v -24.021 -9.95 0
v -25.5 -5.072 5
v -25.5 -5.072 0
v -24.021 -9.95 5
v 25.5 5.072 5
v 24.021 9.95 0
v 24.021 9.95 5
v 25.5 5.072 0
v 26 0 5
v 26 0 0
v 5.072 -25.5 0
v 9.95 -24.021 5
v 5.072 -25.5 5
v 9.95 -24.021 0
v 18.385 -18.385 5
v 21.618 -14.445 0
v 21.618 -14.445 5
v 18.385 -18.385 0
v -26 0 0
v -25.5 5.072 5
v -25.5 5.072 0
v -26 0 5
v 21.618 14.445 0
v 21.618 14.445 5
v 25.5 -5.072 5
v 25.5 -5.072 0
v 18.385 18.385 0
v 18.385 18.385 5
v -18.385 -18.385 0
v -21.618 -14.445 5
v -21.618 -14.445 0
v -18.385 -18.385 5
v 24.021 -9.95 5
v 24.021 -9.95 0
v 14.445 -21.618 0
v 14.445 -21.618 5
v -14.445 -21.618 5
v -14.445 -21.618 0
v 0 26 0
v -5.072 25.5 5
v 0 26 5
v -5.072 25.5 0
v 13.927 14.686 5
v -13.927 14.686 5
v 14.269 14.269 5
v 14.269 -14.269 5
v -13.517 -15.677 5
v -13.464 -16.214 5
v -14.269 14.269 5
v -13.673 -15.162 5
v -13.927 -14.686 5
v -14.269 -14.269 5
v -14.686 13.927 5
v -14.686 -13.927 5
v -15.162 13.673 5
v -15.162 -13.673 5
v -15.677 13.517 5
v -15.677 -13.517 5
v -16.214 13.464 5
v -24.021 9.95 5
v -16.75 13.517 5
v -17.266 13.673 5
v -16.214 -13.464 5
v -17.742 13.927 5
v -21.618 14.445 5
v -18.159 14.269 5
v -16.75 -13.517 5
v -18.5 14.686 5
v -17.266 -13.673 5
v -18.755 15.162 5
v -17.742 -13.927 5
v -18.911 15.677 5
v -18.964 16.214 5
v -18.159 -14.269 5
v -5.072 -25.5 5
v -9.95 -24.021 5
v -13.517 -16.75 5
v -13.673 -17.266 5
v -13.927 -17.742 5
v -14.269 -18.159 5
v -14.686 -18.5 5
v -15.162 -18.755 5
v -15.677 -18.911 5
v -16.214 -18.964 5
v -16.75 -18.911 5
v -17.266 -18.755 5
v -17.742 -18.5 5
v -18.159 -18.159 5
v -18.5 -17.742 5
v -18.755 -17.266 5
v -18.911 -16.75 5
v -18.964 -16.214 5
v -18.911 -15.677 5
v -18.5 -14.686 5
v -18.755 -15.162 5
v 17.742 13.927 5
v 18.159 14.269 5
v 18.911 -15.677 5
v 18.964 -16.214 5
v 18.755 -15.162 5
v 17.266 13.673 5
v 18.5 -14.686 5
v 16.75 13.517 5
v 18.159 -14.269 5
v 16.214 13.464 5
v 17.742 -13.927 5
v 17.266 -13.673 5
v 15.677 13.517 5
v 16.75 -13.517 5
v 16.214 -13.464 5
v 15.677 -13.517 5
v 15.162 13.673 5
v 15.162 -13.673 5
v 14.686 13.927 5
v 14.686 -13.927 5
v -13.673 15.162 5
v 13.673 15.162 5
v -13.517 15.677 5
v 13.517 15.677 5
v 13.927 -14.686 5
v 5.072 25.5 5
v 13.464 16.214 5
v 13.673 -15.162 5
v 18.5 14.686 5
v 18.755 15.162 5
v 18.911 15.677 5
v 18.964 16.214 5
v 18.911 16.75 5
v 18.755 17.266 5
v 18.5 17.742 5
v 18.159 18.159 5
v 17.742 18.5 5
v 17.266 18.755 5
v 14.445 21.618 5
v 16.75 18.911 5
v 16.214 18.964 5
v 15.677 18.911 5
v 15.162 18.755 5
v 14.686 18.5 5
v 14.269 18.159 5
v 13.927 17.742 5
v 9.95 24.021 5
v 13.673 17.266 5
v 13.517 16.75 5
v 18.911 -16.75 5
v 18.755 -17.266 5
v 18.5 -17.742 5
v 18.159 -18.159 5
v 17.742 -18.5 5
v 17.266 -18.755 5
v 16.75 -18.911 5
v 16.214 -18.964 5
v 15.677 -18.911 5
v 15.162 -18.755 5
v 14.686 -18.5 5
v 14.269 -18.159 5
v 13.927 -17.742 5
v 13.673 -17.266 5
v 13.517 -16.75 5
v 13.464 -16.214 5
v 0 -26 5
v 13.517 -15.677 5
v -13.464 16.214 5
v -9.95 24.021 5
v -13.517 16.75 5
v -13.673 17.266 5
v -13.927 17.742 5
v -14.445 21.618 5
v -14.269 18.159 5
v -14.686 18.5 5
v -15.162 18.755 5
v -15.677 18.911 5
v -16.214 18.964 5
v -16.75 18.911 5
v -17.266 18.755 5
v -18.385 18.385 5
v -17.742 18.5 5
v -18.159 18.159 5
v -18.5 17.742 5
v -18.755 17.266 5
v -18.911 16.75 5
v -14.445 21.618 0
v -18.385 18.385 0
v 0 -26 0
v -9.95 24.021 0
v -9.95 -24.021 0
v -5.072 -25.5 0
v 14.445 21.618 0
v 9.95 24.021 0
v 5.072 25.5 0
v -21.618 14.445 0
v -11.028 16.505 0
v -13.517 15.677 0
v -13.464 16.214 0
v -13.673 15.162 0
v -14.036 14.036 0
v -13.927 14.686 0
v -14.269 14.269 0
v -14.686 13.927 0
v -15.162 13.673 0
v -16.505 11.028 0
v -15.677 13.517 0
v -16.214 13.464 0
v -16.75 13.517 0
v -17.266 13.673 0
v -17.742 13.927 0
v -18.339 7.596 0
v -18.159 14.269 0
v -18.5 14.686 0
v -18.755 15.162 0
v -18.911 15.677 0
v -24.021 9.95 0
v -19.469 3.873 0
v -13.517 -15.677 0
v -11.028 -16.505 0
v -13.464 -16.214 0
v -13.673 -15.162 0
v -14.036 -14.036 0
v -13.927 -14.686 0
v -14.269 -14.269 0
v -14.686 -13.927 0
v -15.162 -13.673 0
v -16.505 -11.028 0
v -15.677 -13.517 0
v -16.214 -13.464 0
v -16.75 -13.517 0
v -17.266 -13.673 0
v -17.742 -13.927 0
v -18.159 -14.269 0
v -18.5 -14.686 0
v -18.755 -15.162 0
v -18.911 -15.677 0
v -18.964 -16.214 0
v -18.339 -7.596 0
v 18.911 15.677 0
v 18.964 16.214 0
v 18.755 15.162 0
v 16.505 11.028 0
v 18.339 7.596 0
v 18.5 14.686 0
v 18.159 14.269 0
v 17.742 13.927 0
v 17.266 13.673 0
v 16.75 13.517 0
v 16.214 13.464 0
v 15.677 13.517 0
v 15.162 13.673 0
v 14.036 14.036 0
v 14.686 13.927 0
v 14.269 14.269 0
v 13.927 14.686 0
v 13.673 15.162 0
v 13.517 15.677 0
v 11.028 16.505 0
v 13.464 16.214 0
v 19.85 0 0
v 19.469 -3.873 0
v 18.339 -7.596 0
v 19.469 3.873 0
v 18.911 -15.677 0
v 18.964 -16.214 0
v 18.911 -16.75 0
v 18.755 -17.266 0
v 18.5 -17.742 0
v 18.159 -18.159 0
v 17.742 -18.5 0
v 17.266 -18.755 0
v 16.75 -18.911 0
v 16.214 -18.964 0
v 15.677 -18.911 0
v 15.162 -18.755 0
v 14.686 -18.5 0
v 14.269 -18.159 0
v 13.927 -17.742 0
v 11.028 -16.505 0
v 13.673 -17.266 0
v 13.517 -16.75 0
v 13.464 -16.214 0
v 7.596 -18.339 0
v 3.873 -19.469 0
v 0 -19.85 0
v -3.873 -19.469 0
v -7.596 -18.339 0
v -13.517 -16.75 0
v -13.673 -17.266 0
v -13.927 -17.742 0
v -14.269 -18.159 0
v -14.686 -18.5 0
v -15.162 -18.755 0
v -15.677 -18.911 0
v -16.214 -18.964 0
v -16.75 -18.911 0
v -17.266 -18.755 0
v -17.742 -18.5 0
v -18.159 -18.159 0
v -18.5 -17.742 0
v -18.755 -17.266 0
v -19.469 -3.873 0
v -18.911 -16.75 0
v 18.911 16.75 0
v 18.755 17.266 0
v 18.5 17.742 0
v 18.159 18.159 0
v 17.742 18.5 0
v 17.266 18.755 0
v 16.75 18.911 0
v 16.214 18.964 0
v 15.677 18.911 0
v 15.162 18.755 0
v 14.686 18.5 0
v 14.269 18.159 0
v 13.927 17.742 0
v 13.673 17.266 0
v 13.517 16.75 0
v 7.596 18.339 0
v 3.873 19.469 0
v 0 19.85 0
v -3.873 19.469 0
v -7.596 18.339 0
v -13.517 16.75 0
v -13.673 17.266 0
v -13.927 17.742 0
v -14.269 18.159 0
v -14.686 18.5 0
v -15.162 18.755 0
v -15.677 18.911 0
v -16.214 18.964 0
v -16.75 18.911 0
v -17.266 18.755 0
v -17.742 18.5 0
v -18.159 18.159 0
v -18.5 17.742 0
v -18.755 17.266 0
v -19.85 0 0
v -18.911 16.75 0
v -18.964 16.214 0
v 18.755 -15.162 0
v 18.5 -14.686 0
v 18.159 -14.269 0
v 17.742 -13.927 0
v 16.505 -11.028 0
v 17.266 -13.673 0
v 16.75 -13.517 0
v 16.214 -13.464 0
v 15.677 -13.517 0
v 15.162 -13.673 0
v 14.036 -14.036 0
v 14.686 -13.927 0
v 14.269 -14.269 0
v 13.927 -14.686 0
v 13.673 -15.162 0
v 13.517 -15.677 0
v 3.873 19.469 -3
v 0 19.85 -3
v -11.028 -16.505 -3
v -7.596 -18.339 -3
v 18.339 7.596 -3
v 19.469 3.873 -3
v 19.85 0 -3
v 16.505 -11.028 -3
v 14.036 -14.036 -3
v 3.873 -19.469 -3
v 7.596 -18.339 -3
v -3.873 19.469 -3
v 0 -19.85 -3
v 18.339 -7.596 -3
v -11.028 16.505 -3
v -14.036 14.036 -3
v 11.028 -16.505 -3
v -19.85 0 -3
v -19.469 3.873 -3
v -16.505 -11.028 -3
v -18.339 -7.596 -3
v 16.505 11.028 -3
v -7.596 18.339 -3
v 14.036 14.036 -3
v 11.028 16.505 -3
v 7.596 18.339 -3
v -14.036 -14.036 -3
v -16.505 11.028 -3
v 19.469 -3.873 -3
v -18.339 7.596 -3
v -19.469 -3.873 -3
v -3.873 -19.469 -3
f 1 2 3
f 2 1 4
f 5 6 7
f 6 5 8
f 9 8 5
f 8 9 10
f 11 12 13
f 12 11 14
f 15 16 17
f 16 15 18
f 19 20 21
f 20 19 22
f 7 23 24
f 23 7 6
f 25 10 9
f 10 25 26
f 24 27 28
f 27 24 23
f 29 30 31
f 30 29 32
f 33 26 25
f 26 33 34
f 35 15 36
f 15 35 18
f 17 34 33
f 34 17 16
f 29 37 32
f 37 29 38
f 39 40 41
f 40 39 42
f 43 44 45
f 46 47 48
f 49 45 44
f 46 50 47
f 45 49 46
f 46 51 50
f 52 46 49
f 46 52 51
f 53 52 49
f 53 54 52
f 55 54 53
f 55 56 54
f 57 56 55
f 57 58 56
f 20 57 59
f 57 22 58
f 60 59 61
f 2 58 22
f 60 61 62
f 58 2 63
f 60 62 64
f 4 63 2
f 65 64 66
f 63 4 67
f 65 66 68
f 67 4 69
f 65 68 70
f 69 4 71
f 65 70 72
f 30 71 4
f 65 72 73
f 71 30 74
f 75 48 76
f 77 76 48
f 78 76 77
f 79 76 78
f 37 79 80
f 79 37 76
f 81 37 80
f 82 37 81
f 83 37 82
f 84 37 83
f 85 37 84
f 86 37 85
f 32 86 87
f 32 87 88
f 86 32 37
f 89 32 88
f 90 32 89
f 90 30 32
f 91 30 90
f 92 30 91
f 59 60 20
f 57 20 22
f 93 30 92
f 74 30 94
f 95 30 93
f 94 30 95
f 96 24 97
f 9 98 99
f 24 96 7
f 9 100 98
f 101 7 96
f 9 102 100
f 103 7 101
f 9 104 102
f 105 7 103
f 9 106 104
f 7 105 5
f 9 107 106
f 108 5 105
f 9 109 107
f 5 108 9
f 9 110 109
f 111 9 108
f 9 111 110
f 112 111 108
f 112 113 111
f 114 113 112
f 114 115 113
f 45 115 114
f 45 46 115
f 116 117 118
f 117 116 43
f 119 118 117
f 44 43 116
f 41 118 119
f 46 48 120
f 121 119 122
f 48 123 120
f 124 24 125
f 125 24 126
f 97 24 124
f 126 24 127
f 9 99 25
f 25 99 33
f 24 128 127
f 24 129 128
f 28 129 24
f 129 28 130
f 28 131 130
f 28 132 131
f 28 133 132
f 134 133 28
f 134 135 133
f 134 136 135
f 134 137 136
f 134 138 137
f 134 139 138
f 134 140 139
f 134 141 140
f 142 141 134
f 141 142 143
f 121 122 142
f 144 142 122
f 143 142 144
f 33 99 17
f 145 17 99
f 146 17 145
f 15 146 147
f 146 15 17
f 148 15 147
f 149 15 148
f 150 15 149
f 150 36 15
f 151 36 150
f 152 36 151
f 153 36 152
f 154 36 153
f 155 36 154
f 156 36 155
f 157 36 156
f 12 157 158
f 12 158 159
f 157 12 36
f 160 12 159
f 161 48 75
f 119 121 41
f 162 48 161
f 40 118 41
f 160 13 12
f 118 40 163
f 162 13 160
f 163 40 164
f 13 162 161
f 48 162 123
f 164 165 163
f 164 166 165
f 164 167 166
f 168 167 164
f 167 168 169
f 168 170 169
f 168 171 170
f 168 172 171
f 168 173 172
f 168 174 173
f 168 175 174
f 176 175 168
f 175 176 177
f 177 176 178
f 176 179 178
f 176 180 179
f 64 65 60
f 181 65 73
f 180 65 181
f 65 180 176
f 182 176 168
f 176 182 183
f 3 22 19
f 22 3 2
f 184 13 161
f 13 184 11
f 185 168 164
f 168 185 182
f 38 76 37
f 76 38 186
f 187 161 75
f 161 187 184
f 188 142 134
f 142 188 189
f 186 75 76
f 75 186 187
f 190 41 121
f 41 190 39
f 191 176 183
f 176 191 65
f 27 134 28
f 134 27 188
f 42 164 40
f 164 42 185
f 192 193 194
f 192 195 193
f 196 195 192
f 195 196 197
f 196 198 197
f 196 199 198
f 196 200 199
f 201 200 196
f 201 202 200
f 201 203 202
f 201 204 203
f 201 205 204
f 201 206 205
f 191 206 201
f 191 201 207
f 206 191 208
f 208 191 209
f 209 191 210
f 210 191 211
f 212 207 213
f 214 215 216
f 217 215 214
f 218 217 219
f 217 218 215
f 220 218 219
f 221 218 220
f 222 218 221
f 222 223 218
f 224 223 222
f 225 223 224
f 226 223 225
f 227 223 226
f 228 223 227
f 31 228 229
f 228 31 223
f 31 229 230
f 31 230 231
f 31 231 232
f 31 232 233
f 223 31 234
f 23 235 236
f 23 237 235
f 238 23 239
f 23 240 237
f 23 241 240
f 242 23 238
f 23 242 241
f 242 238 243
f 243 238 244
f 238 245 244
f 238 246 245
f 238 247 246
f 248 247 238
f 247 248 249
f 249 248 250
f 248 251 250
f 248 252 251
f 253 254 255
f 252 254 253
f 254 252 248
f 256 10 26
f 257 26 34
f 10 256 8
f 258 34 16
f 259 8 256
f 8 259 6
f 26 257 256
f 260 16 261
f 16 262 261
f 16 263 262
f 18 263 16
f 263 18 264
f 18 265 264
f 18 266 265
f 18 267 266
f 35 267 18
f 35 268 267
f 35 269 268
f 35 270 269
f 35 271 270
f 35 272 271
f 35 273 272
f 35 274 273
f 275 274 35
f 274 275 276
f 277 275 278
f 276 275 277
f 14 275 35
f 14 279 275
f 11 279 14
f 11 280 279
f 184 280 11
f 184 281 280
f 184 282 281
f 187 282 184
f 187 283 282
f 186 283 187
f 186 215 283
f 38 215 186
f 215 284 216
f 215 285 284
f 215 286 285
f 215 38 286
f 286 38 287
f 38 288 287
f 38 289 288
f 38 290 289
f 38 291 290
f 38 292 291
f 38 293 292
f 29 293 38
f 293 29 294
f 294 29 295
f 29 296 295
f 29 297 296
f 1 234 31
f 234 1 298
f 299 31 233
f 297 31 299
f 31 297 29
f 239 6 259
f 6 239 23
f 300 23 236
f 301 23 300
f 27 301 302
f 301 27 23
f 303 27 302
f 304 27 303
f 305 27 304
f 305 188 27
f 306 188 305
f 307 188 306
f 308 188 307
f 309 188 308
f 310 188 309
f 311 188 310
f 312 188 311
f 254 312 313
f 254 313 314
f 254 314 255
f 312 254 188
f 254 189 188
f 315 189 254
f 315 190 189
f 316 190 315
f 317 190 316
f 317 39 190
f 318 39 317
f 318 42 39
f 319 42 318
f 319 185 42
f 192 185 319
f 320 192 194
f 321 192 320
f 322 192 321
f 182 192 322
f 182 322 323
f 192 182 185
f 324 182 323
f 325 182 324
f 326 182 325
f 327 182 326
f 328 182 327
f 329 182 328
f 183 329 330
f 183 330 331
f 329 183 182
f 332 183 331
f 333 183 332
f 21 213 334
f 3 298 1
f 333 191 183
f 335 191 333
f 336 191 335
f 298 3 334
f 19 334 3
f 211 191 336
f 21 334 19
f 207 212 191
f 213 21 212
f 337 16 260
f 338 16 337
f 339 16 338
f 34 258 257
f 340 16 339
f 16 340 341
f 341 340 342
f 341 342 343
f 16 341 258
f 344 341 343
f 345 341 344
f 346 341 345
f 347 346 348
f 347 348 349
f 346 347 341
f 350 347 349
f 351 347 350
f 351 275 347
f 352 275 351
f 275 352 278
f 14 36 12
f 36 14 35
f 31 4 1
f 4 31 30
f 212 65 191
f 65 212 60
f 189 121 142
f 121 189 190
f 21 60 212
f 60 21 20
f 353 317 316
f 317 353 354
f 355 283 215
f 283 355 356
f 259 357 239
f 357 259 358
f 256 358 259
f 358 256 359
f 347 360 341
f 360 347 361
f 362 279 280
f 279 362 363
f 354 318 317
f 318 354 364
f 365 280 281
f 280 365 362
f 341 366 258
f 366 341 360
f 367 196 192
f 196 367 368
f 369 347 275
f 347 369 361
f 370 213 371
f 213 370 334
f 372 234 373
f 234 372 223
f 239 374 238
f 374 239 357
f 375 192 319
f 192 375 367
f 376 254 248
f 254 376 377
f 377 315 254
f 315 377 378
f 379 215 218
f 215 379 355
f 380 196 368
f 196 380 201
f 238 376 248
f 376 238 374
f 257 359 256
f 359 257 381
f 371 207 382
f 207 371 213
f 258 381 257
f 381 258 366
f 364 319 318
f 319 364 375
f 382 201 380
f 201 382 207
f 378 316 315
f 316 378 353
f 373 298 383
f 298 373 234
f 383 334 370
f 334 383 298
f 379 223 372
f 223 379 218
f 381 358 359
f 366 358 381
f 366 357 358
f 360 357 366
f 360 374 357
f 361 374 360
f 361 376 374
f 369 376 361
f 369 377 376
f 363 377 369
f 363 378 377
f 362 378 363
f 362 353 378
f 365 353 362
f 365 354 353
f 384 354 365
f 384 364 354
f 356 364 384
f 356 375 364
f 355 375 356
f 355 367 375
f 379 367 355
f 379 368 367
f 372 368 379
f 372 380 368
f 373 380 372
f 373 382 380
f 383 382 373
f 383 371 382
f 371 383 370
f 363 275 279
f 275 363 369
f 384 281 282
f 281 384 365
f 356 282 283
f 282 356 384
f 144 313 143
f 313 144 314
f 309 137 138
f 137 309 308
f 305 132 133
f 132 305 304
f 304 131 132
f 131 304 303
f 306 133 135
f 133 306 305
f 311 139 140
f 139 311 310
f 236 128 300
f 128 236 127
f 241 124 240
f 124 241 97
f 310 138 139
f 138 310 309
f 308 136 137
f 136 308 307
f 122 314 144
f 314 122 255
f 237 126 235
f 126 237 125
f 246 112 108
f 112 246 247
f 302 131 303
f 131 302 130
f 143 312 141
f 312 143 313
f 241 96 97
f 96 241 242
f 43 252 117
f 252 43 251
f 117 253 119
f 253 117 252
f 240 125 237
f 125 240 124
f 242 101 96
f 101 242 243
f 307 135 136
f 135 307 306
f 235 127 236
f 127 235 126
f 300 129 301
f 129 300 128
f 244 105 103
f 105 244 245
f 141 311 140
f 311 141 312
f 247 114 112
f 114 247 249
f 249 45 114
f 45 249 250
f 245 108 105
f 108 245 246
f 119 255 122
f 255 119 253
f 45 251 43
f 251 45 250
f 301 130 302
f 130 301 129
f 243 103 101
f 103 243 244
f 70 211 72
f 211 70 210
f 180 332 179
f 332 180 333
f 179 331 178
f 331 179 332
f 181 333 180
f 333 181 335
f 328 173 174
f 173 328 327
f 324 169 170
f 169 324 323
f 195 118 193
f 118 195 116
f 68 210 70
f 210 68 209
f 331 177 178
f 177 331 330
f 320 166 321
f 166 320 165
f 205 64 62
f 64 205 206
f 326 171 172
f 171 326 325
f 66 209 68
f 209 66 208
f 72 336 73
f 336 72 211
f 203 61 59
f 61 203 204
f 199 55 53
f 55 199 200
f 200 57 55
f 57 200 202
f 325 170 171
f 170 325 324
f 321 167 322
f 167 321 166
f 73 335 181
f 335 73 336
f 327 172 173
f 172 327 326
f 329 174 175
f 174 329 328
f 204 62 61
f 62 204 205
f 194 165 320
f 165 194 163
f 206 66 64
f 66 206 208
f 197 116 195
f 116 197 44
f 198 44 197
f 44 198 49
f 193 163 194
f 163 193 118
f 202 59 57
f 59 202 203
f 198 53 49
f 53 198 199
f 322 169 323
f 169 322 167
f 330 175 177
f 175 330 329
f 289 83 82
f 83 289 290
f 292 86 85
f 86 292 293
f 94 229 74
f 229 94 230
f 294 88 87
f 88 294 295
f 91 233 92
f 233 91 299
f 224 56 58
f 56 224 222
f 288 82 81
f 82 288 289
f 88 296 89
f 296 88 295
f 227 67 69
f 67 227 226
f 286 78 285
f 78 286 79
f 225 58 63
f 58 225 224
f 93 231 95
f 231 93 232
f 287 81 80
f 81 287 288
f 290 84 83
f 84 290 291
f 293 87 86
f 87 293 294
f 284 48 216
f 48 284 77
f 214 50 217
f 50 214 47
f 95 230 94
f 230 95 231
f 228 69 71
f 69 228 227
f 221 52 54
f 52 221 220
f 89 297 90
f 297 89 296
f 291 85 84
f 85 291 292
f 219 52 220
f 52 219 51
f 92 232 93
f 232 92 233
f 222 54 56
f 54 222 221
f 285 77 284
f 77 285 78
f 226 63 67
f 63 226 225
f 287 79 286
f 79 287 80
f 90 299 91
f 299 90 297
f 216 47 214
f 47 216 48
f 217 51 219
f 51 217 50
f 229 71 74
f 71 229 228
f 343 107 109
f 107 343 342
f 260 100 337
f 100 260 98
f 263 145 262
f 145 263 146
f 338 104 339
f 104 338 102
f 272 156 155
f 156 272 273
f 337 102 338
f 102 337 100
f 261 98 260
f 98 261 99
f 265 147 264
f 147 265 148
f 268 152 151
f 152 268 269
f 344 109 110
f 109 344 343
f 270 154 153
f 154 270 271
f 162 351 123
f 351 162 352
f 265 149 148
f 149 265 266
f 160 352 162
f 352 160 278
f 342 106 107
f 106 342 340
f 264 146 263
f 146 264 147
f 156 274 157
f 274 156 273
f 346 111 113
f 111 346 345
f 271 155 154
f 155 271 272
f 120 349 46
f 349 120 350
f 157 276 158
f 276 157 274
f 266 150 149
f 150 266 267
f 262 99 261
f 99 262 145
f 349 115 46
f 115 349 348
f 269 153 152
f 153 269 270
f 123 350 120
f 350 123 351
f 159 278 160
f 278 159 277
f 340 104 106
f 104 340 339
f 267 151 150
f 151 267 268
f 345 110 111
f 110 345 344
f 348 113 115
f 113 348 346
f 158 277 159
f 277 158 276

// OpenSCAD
$fn = 32;

// ----------------------------------------------------------------------
// Retaining cap: 6203 cover, 52 mm, spigot 39.7 mm
// ----------------------------------------------------------------------

// --- parameters (mm) ---
cap_d = 52;               // cover diameter
cap_t = 5;                // cover thickness
lip_d = 39.7;             // spigot that enters the housing
lip_h = 3;                // spigot height
bolt_d = 5.5;             // bolt clearance
bolt_r = 22.93;           // bolt circle radius

module cover() {
  cylinder(h = cap_t, d = cap_d);
}

module spigot() {
  /* sunk 1 mm into the cover; the spigot sets the overall height */
  translate([0, 0, -lip_h]) cylinder(h = lip_h + 1, d = lip_d);
}

difference() {
  union() {
    cover();
    spigot();
  }
  for (i = [0 : 3]) rotate([0, 0, 45 + i * 90]) translate([bolt_r, 0, -lip_h - 1])
    cylinder(h = lip_h + cap_t + 2, d = bolt_d);
}
